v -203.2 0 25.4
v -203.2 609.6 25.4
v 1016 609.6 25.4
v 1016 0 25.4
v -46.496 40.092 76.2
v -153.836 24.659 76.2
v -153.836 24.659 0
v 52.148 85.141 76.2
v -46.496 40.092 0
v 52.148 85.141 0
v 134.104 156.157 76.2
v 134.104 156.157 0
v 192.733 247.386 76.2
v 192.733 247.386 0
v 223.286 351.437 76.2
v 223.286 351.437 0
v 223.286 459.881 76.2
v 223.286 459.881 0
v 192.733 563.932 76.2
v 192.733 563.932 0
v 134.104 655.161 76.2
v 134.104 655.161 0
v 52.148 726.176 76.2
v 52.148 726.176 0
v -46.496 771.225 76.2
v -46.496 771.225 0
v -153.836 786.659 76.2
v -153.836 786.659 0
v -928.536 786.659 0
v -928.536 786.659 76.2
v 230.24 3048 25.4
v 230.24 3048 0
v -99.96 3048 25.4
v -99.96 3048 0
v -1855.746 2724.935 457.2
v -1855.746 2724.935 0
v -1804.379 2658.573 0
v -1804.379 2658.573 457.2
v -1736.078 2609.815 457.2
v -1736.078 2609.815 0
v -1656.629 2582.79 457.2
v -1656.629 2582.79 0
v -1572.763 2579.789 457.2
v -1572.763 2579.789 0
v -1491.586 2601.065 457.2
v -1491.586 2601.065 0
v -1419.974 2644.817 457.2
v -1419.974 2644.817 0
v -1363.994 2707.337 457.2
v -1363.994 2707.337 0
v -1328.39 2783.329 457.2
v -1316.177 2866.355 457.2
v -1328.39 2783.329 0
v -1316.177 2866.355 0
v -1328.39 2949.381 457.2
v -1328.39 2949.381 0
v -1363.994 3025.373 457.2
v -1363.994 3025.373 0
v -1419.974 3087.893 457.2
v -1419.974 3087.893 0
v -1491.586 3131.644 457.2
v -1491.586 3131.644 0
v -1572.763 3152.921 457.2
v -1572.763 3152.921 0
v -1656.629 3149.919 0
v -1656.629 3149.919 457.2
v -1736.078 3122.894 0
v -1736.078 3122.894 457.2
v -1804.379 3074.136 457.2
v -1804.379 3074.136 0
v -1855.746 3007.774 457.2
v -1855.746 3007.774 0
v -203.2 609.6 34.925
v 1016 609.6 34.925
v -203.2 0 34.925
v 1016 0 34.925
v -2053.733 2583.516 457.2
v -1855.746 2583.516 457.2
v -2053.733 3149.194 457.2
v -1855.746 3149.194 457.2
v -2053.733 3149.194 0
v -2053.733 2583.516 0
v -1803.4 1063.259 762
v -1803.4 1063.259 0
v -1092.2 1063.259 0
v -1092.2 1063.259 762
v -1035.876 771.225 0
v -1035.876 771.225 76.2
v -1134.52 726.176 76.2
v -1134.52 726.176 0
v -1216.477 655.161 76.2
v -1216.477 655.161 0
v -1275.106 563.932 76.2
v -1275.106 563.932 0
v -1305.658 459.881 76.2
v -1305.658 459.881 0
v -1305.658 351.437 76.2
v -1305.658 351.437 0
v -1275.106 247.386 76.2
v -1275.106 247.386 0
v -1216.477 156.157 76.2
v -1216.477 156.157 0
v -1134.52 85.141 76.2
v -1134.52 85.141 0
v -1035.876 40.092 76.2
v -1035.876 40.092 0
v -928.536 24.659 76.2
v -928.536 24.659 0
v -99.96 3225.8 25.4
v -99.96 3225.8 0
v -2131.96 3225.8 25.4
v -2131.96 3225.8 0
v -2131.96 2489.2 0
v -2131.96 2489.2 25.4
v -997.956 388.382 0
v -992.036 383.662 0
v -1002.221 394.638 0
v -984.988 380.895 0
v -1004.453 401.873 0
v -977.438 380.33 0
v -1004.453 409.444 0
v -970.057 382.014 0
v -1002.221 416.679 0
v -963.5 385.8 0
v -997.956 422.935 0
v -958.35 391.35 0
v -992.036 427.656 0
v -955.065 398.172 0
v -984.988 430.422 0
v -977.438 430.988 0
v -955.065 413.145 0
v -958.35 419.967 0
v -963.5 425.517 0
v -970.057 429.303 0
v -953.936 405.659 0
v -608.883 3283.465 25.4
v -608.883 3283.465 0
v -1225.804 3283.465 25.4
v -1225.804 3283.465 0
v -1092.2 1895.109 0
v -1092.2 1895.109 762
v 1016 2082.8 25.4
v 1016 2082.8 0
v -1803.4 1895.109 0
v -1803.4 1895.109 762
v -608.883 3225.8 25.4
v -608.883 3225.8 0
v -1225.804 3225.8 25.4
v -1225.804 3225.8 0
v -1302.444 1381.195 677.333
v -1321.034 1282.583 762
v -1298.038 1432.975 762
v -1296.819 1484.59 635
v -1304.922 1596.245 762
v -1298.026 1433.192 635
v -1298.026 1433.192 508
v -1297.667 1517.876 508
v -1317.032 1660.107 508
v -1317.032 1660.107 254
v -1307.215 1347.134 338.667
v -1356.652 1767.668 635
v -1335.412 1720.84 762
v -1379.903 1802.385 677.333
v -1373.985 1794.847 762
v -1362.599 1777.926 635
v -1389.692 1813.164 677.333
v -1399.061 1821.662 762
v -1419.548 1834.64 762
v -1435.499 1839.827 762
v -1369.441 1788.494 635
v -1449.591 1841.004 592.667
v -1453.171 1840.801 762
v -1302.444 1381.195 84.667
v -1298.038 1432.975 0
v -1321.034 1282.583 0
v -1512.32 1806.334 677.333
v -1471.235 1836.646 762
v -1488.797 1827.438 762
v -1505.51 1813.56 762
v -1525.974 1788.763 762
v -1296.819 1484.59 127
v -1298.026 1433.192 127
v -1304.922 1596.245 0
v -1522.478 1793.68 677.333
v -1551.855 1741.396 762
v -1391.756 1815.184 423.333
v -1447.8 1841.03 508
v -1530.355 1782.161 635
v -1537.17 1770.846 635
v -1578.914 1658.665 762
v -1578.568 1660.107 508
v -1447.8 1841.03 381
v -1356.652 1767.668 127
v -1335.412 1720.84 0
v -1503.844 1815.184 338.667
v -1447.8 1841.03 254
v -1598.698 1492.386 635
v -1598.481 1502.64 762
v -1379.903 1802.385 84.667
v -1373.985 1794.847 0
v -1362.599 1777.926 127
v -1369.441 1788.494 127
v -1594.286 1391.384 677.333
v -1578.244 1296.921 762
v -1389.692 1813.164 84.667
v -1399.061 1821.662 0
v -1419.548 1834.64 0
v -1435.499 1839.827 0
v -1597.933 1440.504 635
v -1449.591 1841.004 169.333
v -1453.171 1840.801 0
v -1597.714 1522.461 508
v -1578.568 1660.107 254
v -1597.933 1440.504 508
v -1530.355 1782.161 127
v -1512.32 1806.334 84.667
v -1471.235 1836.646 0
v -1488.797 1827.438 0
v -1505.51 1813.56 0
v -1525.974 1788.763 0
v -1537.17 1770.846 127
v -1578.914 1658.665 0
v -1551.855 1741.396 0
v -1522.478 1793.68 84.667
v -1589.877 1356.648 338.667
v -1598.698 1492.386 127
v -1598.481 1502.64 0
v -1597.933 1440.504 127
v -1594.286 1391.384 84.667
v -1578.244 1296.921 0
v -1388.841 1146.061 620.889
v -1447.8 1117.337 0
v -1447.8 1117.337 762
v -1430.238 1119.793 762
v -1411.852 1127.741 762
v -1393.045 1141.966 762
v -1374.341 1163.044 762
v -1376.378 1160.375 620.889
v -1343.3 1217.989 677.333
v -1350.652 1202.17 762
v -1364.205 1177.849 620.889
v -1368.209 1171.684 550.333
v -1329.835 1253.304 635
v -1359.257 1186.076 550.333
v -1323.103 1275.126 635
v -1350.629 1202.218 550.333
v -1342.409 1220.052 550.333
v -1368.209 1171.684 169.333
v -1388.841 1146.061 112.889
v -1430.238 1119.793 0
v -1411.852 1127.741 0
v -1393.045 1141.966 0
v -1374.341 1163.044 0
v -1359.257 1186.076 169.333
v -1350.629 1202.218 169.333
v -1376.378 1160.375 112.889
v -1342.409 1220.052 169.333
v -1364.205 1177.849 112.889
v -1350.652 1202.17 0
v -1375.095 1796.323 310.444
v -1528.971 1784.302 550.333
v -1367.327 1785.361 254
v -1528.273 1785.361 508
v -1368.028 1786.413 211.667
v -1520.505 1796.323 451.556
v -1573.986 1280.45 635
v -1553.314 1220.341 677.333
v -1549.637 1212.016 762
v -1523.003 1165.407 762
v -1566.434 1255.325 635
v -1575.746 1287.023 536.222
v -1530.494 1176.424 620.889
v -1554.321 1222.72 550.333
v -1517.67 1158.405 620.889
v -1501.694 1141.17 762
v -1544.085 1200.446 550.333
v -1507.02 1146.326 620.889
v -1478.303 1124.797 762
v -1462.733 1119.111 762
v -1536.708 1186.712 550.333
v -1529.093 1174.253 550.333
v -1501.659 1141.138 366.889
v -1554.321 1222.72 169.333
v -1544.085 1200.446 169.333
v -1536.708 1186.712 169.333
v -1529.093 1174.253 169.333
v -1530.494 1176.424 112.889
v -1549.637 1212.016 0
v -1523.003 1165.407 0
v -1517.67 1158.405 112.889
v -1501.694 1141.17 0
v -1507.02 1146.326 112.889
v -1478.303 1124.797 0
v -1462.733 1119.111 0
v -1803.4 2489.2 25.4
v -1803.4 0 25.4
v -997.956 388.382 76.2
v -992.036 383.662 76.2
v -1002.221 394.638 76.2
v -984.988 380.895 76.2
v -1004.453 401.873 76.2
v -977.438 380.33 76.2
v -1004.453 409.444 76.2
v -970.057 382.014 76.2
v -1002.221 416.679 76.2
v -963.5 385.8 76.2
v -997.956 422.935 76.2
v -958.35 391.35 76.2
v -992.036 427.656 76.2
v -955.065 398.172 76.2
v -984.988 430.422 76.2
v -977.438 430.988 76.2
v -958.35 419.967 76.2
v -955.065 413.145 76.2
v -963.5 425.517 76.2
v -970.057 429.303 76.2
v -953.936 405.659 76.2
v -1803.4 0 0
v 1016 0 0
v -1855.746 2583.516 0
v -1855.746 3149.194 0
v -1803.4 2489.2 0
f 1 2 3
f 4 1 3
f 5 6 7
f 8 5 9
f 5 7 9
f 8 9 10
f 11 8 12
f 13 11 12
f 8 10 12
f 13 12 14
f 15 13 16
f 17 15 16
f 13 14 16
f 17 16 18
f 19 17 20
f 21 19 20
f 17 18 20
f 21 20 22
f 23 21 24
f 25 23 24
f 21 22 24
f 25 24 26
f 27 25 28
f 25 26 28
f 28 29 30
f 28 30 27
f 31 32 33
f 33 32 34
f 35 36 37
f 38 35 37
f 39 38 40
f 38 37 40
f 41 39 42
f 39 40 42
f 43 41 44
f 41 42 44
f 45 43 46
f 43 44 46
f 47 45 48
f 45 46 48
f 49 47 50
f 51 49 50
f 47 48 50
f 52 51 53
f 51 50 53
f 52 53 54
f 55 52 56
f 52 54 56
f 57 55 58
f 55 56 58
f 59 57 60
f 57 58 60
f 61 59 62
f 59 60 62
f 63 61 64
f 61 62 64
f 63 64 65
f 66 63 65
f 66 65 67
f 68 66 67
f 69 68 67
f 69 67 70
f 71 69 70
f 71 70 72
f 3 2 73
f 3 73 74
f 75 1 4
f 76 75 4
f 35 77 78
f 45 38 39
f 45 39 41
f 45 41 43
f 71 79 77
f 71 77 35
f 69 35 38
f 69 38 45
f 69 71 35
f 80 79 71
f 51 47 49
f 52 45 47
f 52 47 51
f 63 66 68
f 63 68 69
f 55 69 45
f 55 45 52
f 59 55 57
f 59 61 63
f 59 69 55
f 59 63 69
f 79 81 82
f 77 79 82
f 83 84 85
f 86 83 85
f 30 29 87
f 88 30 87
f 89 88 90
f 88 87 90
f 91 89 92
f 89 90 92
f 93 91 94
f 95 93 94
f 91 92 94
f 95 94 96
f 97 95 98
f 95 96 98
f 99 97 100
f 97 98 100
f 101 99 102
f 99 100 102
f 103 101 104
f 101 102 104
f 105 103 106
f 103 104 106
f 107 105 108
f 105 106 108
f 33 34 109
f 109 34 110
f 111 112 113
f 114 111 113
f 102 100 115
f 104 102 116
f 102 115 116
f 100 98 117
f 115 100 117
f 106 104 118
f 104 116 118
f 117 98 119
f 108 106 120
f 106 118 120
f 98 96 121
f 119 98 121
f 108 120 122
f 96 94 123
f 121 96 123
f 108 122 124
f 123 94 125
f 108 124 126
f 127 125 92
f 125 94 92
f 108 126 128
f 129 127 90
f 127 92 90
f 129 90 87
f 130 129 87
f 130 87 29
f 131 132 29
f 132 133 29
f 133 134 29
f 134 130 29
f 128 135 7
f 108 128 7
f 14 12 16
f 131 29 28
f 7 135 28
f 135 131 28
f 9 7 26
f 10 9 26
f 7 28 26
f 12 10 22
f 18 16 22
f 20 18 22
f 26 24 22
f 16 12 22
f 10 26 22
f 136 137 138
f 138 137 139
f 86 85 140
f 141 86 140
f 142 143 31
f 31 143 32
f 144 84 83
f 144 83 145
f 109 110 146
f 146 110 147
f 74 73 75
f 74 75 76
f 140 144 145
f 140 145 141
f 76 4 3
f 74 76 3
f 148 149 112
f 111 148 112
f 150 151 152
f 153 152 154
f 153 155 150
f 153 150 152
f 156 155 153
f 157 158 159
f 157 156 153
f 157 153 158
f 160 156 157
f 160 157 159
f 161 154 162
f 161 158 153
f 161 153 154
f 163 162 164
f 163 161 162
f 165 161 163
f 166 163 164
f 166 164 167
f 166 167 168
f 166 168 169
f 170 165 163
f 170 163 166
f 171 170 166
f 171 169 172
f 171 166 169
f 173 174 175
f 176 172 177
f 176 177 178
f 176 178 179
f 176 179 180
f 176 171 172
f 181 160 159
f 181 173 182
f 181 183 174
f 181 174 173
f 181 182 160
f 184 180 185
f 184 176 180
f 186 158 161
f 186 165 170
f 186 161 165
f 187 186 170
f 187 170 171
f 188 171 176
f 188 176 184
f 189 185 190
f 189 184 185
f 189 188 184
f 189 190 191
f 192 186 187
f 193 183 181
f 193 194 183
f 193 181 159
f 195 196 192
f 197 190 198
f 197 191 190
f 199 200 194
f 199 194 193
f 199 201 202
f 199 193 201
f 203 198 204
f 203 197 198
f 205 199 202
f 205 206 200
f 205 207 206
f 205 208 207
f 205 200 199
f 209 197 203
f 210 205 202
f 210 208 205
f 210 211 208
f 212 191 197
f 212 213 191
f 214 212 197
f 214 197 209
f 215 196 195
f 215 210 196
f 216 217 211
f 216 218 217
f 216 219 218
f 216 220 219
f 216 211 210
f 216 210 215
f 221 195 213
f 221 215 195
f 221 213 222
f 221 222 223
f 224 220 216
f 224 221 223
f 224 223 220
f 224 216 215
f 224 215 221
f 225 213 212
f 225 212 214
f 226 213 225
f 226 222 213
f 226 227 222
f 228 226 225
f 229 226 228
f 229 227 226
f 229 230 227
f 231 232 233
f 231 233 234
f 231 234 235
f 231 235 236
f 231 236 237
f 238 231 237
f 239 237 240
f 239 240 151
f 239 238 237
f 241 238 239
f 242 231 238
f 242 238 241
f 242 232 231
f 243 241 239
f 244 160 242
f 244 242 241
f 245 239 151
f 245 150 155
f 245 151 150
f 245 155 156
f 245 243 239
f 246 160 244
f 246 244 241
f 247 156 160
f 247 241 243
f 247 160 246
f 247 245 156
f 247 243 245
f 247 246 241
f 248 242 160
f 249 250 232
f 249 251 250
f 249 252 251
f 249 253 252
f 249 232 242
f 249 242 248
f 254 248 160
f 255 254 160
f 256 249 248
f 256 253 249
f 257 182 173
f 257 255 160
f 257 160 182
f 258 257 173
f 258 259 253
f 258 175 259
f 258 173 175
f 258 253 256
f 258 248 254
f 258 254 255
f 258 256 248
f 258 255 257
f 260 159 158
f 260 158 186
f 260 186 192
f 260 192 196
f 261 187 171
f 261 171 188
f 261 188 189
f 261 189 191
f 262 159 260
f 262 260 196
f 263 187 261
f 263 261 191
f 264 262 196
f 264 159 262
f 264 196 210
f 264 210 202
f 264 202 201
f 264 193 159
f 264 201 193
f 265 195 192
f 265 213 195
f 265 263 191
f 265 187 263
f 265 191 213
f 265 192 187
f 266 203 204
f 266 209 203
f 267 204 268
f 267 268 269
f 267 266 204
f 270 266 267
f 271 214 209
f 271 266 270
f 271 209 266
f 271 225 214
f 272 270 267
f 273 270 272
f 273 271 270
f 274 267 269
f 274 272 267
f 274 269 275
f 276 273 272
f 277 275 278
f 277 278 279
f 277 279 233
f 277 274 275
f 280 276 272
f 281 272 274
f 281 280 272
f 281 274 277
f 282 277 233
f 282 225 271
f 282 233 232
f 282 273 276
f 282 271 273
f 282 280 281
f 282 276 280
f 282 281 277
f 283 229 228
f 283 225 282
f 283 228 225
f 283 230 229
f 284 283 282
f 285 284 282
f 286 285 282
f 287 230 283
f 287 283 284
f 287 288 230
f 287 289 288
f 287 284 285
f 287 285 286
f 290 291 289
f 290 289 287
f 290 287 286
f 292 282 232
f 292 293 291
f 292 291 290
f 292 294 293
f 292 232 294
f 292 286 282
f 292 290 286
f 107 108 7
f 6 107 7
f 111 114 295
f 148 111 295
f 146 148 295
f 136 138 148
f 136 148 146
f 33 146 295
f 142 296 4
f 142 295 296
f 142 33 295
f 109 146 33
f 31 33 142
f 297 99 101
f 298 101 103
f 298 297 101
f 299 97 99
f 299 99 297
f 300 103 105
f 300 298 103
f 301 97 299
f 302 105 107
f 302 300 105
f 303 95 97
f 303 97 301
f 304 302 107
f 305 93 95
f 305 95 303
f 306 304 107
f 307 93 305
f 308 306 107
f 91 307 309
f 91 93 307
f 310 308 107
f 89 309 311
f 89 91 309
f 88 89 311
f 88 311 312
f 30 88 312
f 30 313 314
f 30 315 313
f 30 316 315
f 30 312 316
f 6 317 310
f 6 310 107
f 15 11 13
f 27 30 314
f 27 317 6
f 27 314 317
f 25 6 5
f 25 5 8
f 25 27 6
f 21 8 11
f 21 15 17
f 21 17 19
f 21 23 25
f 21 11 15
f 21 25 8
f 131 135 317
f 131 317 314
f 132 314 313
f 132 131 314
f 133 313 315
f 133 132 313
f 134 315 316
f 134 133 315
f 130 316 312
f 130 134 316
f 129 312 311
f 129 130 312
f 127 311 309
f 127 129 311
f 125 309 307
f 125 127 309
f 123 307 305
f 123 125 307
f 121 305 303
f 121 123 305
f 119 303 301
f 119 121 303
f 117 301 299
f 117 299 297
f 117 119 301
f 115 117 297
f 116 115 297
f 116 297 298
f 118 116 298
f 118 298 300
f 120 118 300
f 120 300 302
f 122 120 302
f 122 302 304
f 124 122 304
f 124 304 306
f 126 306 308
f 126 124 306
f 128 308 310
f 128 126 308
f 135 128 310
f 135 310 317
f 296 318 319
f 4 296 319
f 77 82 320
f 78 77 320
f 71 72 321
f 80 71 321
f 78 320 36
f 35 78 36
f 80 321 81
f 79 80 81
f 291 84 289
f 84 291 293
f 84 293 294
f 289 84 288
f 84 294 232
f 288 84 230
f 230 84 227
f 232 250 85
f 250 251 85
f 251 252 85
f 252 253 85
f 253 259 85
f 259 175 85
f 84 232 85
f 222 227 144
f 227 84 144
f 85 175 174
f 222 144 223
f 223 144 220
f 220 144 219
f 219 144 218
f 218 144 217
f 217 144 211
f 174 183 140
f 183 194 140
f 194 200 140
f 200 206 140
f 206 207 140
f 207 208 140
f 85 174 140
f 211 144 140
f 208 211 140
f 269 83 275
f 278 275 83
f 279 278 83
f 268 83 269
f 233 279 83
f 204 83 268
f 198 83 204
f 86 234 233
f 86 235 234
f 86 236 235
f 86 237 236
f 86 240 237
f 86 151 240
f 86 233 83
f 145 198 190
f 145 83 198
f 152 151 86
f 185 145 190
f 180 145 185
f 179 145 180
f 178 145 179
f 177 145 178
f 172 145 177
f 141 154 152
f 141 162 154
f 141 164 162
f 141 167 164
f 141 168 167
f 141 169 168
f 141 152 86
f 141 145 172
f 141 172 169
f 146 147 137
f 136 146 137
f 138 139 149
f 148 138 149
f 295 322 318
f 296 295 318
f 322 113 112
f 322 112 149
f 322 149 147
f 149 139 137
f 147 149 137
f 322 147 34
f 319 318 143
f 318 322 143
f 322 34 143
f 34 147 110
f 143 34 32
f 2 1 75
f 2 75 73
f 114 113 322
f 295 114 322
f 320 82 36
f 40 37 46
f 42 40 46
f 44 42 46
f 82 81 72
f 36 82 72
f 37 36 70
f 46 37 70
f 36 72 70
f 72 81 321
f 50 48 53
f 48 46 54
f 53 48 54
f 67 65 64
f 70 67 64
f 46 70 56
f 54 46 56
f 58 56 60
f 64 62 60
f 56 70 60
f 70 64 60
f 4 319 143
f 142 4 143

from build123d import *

# Parameters (mm, degrees)
F1_DEPTH = 25.4
F2_W     = 1219.2
F2_H     = 609.6
F3_DEPTH = 9.525
F4_W     = 774.7
F4_H     = 762
F4_R     = 25.4
F5_DEPTH = 76.2
F7_DEPTH = 457.2
F8_W     = 711.2
F8_H     = 831.85
F9_DEPTH = 762


with BuildPart() as f1:
    # F0 (on Top) → F1 (new body)
    with BuildSketch(Plane.XY):
        Polygon((-1803.4, 0), (0, 0), (1016, 0), (1016, 2082.8), (230.240418, 3048), (-99.959582, 3048), (-99.959582, 3225.8), (-608.882606, 3225.8), (-608.882606, 3283.465385), (-1225.80409, 3283.465385), (-1225.80409, 3225.8), (-2131.959582, 3225.8), (-2131.959582, 2489.2), (-1803.4, 2489.2), align=None)
    extrude(amount=F1_DEPTH)


with BuildPart() as f3:
    # F2 (on face) → F3 (new body)
    with BuildSketch(Plane.XY.offset(25.4)):
        with Locations((406.4, 304.8)):
            Rectangle(F2_W, F2_H)
    extrude(amount=F3_DEPTH)


with BuildPart() as f5:
    # F4 (on Top) → F5 (new body)
    with BuildSketch(Plane.XY):
        with Locations((-541.186301, 405.658662)):
            Rectangle(F4_W, F4_H)
        with BuildLine():
            ThreePointArc((-153.836301, 24.658662), (227.163699, 405.658662), (-153.836301, 786.658662))
            Line((-153.836301, 786.658662), (-153.836301, 24.658662))
        make_face()
        with BuildLine():
            Line((-928.536301, 24.658662), (-928.536301, 786.658662))
            ThreePointArc((-928.536301, 786.658662), (-1309.536301, 405.658662), (-928.536301, 24.658662))
        make_face()
        with Locations((-979.336301, 405.658662)):
            Circle(F4_R, mode=Mode.SUBTRACT)
    extrude(amount=F5_DEPTH)


with BuildPart() as f7:
    # F6 (on Top) → F7 (new body)
    with BuildSketch(Plane.XY):
        Polygon((-2053.73311, 2583.515882), (-1855.746031, 2583.515882), (-1855.746031, 2724.935293), (-1855.746031, 3007.773876), (-1855.746031, 3149.193525), (-2053.73311, 3149.193525), align=None)
        with BuildLine():
            Line((-1855.746031, 3007.773876), (-1855.746031, 2724.935293))
            ThreePointArc((-1855.746031, 2724.935293), (-1316.176813, 2866.354585), (-1855.746031, 3007.773876))
        make_face()
    extrude(amount=F7_DEPTH)


with BuildPart() as f9:
    # F8 (on Top) → F9 (new body)
    with BuildSketch(Plane.XY):
        with Locations((-1447.8, 1479.183529)):
            Rectangle(F8_W, F8_H)
        with BuildLine():
            add(Edge.make_bspline(
                [(-1447.8, 1117.337141), (-1186.263309, 1117.337141), (-1317.031655, 1660.106722), (-1447.8, 2202.876303), (-1578.568345, 1660.106722), (-1709.336691, 1117.337141), (-1447.8, 1117.337141)],
                knots=[0, 0, 0, 2.094395, 2.094395, 4.18879, 4.18879, 6.283185, 6.283185, 6.283185], degree=2, weights=[1, 0.5, 1, 0.5, 1, 0.5, 1]))
        make_face(mode=Mode.SUBTRACT)
    extrude(amount=F9_DEPTH)


solid = Compound([f1.part, f3.part, f5.part, f7.part, f9.part])
